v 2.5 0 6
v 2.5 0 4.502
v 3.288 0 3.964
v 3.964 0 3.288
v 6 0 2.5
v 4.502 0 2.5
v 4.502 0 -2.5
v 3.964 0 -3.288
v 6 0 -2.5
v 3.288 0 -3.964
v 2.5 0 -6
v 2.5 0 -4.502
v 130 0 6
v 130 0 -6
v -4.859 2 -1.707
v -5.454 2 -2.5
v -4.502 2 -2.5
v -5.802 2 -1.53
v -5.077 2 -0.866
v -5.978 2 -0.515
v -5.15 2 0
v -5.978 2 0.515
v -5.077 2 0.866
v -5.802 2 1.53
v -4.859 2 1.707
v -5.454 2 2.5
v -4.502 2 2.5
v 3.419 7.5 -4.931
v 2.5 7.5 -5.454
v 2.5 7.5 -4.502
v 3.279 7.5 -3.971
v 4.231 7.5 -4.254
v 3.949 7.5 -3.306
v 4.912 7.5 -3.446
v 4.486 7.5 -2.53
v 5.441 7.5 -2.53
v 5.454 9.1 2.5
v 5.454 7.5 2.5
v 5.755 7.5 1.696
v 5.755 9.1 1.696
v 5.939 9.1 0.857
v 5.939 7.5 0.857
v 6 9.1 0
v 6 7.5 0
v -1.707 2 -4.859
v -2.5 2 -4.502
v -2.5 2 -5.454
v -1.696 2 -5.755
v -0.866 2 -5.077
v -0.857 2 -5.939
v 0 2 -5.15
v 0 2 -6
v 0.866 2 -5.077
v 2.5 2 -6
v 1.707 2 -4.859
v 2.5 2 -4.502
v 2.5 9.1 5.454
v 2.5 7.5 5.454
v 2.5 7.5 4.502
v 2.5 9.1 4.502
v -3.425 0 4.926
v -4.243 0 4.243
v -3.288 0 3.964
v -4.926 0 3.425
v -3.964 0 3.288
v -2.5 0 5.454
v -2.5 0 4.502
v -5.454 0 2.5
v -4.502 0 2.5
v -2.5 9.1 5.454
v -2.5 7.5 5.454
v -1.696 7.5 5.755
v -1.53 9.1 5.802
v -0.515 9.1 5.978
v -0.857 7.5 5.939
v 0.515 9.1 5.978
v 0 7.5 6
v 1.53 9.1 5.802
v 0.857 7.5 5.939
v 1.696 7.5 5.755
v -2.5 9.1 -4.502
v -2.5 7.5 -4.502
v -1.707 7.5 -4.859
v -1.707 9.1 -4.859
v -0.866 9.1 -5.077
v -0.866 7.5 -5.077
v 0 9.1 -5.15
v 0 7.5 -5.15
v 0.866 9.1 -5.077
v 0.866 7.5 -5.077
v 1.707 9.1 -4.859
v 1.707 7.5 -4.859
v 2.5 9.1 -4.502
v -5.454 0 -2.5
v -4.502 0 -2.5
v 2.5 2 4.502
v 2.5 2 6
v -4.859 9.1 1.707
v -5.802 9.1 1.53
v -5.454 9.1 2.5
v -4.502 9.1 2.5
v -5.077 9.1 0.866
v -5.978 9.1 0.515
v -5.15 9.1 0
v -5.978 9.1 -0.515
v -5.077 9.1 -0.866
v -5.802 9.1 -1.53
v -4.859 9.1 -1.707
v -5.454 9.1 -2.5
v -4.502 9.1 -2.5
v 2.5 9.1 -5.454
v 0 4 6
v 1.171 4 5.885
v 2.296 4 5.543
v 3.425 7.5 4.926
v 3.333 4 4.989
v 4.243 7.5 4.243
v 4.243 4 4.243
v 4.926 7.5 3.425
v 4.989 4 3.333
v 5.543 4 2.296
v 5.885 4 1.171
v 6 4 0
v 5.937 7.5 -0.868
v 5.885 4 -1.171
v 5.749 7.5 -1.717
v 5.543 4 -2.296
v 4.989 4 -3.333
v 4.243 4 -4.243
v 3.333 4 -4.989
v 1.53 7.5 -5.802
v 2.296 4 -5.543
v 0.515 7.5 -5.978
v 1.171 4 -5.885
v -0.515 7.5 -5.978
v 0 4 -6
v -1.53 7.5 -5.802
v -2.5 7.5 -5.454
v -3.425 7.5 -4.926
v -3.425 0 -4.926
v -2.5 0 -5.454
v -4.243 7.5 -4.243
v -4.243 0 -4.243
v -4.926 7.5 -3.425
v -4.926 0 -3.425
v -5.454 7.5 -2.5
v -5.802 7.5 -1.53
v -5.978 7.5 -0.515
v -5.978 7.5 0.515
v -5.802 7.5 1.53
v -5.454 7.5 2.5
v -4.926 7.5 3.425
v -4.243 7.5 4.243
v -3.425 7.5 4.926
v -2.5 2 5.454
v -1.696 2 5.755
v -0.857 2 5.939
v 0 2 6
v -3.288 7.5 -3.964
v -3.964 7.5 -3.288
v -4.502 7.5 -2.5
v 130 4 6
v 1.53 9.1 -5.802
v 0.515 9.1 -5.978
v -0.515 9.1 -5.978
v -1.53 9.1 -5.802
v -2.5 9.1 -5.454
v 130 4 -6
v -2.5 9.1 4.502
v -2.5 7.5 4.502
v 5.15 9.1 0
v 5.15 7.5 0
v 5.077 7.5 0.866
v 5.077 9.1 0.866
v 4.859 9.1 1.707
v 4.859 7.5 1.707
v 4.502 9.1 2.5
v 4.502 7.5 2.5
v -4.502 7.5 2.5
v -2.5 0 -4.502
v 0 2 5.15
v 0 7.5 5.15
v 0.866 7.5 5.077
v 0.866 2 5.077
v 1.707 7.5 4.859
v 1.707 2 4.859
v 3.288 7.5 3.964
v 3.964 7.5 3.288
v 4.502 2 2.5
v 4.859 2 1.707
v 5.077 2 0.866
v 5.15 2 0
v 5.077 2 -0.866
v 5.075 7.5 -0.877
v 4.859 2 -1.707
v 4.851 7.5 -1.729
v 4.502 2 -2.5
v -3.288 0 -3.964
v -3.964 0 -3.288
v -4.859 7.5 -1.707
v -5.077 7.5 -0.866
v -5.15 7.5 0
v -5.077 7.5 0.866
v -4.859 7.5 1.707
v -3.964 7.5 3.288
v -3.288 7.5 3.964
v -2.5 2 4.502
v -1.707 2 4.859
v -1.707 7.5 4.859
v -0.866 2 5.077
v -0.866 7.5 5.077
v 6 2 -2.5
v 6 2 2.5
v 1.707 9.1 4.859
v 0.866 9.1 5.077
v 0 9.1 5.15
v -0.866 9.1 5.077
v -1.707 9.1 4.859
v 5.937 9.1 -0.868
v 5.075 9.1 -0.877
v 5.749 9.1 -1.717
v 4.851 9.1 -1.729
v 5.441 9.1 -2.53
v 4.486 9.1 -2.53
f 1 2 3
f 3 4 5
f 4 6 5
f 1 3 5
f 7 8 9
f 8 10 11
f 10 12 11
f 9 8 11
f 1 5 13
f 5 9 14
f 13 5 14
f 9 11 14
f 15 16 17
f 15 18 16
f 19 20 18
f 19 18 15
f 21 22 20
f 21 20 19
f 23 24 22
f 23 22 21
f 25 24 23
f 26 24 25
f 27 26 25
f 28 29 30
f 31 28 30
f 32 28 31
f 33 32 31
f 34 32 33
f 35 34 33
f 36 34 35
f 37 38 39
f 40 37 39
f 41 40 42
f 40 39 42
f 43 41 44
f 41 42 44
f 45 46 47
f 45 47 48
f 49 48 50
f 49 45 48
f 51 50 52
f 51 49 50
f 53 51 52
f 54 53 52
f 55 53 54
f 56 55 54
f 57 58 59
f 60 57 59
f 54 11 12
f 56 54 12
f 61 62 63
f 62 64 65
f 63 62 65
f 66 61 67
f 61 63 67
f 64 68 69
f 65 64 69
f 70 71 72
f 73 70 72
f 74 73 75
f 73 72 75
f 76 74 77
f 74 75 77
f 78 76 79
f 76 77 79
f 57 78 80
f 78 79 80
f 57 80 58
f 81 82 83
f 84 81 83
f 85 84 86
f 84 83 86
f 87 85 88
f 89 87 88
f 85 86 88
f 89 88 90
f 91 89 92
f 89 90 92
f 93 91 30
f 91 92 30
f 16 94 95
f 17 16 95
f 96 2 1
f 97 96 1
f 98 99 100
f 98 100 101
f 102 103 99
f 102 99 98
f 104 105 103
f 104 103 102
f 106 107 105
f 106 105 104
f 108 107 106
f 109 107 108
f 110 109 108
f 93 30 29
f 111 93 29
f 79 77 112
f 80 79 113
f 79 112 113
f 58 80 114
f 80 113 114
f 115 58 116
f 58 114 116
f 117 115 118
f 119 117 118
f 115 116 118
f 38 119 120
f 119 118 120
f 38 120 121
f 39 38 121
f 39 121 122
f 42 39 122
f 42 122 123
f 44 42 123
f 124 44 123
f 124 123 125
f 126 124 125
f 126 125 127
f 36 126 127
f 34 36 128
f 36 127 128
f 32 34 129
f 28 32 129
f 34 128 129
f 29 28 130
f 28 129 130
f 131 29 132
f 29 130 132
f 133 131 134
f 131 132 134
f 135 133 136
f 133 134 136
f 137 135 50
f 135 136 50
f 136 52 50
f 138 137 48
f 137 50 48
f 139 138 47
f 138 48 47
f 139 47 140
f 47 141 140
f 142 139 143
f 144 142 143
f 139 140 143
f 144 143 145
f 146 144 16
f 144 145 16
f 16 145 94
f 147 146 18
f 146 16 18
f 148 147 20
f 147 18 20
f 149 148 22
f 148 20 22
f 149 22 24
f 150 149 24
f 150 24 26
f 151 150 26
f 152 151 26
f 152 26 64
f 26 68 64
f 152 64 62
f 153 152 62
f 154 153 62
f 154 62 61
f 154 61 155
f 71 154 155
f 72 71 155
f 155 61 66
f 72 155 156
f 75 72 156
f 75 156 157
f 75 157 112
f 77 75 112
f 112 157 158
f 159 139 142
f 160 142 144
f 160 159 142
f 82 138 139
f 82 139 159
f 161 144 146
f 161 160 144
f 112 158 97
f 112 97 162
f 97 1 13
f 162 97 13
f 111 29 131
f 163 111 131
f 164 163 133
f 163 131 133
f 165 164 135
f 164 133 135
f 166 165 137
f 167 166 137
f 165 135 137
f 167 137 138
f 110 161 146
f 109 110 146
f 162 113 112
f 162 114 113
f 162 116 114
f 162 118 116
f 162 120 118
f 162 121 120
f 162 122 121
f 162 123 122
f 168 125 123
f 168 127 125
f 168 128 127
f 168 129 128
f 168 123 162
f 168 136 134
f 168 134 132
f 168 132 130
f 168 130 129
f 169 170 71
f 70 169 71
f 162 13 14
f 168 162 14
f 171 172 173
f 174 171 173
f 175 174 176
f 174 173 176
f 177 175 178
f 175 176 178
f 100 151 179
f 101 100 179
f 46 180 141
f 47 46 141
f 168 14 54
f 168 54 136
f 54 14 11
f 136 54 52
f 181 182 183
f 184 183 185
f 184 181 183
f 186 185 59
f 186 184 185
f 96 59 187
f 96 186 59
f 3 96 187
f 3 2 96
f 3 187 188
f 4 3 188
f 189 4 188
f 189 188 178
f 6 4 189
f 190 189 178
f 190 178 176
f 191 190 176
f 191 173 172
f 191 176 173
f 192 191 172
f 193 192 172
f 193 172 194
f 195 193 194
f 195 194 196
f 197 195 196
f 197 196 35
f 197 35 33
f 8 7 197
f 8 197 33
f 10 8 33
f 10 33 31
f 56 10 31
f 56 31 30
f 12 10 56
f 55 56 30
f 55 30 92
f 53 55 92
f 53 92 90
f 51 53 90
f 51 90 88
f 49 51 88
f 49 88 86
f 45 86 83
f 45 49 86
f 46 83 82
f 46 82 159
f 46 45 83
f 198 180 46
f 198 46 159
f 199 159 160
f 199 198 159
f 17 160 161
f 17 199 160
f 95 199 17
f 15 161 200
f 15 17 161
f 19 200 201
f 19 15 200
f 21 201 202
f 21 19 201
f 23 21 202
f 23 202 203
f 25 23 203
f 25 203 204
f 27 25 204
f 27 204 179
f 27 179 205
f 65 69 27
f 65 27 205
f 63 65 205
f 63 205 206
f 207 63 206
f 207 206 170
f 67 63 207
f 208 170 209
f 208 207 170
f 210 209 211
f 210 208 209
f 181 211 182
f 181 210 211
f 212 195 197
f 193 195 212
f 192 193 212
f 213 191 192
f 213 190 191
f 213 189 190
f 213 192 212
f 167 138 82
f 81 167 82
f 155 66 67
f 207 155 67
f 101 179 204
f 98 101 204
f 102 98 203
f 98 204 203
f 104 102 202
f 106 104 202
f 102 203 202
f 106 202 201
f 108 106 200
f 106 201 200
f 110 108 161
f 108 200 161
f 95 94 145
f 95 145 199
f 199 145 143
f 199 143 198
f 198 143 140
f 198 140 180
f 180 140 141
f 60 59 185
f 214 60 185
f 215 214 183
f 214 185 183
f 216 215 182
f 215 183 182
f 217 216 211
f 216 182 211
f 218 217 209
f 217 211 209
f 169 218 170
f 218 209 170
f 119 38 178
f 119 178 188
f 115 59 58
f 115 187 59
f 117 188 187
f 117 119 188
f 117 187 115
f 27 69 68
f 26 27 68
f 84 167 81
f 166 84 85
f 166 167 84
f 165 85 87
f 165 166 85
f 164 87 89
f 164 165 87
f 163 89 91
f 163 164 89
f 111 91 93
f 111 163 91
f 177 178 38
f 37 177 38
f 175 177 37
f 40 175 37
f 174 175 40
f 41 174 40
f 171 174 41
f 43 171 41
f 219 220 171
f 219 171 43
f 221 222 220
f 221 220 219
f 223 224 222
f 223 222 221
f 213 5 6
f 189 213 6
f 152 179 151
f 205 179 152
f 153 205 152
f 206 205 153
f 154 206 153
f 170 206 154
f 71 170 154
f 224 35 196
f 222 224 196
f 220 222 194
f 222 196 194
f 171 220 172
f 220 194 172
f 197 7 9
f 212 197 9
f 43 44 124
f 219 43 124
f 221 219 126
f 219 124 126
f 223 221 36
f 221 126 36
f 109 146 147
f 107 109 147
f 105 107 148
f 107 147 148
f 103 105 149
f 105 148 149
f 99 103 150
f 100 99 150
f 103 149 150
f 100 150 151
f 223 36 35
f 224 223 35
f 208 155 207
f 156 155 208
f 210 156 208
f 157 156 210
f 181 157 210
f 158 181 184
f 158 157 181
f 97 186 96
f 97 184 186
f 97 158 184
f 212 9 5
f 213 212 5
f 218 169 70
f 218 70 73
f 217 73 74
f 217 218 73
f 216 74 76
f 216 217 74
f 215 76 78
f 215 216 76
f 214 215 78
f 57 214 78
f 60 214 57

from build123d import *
from build123d.topology import SkipClean

# Parameters (mm, degrees)
SKETCH_1_R          = 6
SKETCH_1_R_2        = 5.15
EXTRUDE_3_DEPTH     = 4
SKETCH_2_R          = 6
SKETCH_2_R_2        = 5.15
EXTRUDE_4_DEPTH     = 3.5
CUT_EXTRUDE_1_DEPTH = 2
EXTRUDE_5_DEPTH     = 1.6


with BuildPart() as part:
    # 草图1 → 凸台-拉伸3 (new body)
    # profile 1 of 2: a face of its own
    with BuildSketch(Plane(origin=(0, 0, 0), x_dir=(1, 0, 0), z_dir=(0, 1, 0))):
        with BuildLine():
            Line((130, 6), (0, 6))
            ThreePointArc((0, 6), (4.242640687, 4.242640687), (6, 0))
            ThreePointArc((6, 0), (4.242640687, -4.242640687), (0, -6))
            Line((0, -6), (130, -6))
            Line((130, -6), (130, 6))
        make_face()
    # profile 2 of 2: a face of its own
    with BuildSketch(Plane(origin=(0, 0, 0), x_dir=(1, 0, 0), z_dir=(0, 1, 0))):
        Circle(SKETCH_1_R)
        with Locations(Location((0, 0, 0), (0, 0, 270))):
            Circle(SKETCH_1_R_2, mode=Mode.SUBTRACT)
    extrude(amount=EXTRUDE_3_DEPTH)

    # 草图2 → 凸台-拉伸4 (add)
    with BuildSketch(Plane(origin=(0, 4, 0), x_dir=(1, 0, 0), z_dir=(0, 1, 0))):
        with Locations(Location((0, 0, 0), (0, 0, 270))):
            Circle(SKETCH_2_R)
        with Locations(Location((0, 0, 0), (0, 0, 270))):
            Circle(SKETCH_2_R_2, mode=Mode.SUBTRACT)
    extrude(amount=EXTRUDE_4_DEPTH)

    # 草图3 → 切除-拉伸1 (cut)
    with BuildSketch(Plane.XZ):
        Polygon((-2.5, -8.5), (2.5, -8.5), (2.5, -2.5), (6, -2.5), (6, 2.5), (2.5, 2.5), (2.5, 8.5), (-2.5, 8.5), (-2.5, 2.5), (-6, 2.5), (-6, -2.5), (-2.5, -2.5), align=None)
    extrude(amount=-CUT_EXTRUDE_1_DEPTH, mode=Mode.SUBTRACT)

    # 草图4 → 凸台-拉伸5 (add)
    with SkipClean():  # the faces are left unmerged after this step: merging them gives an invalid solid
        with BuildSketch(Plane(origin=(0, 7.5, 0), x_dir=(1, 0, 0), z_dir=(0, 1, 0))):
            with BuildLine():
                ThreePointArc((-4.502499306, -2.5), (-5.15, 0), (-4.502499306, 2.5))
                Line((-4.502499306, 2.5), (-5.454356057, 2.5))
                ThreePointArc((-5.454356057, 2.5), (-6, 0), (-5.454356057, -2.5))
                Line((-5.454356057, -2.5), (-4.502499306, -2.5))
            make_face()
            with BuildLine():
                ThreePointArc((-2.5, 4.502499306), (0, 5.15), (2.5, 4.502499306))
                Line((2.5, 4.502499306), (2.5, 5.454356057))
                ThreePointArc((2.5, 5.454356057), (0, 6), (-2.5, 5.454356057))
                Line((-2.5, 5.454356057), (-2.5, 4.502499306))
            make_face()
            with BuildLine():
                Line((5.440505491, 2.53), (4.485710646, 2.53))
                ThreePointArc((4.485710646, 2.53), (4.981159997, 1.307878085), (5.15, 0))
                ThreePointArc((5.15, 0), (4.985497539, -1.291245247), (4.502499306, -2.5))
                Line((4.502499306, -2.5), (5.454356057, -2.5))
                ThreePointArc((5.454356057, -2.5), (5.862002062, -1.279426367), (6, 0))
                ThreePointArc((6, 0), (5.858456834, 1.295563015), (5.440505491, 2.53))
            make_face()
            with BuildLine():
                Line((2.5, -5.454356057), (2.5, -4.502499306))
                ThreePointArc((2.5, -4.502499306), (0, -5.15), (-2.5, -4.502499306))
                Line((-2.5, -4.502499306), (-2.5, -5.454356057))
                ThreePointArc((-2.5, -5.454356057), (0, -6), (2.5, -5.454356057))
            make_face()
        extrude(amount=EXTRUDE_5_DEPTH)


solid = part.part
